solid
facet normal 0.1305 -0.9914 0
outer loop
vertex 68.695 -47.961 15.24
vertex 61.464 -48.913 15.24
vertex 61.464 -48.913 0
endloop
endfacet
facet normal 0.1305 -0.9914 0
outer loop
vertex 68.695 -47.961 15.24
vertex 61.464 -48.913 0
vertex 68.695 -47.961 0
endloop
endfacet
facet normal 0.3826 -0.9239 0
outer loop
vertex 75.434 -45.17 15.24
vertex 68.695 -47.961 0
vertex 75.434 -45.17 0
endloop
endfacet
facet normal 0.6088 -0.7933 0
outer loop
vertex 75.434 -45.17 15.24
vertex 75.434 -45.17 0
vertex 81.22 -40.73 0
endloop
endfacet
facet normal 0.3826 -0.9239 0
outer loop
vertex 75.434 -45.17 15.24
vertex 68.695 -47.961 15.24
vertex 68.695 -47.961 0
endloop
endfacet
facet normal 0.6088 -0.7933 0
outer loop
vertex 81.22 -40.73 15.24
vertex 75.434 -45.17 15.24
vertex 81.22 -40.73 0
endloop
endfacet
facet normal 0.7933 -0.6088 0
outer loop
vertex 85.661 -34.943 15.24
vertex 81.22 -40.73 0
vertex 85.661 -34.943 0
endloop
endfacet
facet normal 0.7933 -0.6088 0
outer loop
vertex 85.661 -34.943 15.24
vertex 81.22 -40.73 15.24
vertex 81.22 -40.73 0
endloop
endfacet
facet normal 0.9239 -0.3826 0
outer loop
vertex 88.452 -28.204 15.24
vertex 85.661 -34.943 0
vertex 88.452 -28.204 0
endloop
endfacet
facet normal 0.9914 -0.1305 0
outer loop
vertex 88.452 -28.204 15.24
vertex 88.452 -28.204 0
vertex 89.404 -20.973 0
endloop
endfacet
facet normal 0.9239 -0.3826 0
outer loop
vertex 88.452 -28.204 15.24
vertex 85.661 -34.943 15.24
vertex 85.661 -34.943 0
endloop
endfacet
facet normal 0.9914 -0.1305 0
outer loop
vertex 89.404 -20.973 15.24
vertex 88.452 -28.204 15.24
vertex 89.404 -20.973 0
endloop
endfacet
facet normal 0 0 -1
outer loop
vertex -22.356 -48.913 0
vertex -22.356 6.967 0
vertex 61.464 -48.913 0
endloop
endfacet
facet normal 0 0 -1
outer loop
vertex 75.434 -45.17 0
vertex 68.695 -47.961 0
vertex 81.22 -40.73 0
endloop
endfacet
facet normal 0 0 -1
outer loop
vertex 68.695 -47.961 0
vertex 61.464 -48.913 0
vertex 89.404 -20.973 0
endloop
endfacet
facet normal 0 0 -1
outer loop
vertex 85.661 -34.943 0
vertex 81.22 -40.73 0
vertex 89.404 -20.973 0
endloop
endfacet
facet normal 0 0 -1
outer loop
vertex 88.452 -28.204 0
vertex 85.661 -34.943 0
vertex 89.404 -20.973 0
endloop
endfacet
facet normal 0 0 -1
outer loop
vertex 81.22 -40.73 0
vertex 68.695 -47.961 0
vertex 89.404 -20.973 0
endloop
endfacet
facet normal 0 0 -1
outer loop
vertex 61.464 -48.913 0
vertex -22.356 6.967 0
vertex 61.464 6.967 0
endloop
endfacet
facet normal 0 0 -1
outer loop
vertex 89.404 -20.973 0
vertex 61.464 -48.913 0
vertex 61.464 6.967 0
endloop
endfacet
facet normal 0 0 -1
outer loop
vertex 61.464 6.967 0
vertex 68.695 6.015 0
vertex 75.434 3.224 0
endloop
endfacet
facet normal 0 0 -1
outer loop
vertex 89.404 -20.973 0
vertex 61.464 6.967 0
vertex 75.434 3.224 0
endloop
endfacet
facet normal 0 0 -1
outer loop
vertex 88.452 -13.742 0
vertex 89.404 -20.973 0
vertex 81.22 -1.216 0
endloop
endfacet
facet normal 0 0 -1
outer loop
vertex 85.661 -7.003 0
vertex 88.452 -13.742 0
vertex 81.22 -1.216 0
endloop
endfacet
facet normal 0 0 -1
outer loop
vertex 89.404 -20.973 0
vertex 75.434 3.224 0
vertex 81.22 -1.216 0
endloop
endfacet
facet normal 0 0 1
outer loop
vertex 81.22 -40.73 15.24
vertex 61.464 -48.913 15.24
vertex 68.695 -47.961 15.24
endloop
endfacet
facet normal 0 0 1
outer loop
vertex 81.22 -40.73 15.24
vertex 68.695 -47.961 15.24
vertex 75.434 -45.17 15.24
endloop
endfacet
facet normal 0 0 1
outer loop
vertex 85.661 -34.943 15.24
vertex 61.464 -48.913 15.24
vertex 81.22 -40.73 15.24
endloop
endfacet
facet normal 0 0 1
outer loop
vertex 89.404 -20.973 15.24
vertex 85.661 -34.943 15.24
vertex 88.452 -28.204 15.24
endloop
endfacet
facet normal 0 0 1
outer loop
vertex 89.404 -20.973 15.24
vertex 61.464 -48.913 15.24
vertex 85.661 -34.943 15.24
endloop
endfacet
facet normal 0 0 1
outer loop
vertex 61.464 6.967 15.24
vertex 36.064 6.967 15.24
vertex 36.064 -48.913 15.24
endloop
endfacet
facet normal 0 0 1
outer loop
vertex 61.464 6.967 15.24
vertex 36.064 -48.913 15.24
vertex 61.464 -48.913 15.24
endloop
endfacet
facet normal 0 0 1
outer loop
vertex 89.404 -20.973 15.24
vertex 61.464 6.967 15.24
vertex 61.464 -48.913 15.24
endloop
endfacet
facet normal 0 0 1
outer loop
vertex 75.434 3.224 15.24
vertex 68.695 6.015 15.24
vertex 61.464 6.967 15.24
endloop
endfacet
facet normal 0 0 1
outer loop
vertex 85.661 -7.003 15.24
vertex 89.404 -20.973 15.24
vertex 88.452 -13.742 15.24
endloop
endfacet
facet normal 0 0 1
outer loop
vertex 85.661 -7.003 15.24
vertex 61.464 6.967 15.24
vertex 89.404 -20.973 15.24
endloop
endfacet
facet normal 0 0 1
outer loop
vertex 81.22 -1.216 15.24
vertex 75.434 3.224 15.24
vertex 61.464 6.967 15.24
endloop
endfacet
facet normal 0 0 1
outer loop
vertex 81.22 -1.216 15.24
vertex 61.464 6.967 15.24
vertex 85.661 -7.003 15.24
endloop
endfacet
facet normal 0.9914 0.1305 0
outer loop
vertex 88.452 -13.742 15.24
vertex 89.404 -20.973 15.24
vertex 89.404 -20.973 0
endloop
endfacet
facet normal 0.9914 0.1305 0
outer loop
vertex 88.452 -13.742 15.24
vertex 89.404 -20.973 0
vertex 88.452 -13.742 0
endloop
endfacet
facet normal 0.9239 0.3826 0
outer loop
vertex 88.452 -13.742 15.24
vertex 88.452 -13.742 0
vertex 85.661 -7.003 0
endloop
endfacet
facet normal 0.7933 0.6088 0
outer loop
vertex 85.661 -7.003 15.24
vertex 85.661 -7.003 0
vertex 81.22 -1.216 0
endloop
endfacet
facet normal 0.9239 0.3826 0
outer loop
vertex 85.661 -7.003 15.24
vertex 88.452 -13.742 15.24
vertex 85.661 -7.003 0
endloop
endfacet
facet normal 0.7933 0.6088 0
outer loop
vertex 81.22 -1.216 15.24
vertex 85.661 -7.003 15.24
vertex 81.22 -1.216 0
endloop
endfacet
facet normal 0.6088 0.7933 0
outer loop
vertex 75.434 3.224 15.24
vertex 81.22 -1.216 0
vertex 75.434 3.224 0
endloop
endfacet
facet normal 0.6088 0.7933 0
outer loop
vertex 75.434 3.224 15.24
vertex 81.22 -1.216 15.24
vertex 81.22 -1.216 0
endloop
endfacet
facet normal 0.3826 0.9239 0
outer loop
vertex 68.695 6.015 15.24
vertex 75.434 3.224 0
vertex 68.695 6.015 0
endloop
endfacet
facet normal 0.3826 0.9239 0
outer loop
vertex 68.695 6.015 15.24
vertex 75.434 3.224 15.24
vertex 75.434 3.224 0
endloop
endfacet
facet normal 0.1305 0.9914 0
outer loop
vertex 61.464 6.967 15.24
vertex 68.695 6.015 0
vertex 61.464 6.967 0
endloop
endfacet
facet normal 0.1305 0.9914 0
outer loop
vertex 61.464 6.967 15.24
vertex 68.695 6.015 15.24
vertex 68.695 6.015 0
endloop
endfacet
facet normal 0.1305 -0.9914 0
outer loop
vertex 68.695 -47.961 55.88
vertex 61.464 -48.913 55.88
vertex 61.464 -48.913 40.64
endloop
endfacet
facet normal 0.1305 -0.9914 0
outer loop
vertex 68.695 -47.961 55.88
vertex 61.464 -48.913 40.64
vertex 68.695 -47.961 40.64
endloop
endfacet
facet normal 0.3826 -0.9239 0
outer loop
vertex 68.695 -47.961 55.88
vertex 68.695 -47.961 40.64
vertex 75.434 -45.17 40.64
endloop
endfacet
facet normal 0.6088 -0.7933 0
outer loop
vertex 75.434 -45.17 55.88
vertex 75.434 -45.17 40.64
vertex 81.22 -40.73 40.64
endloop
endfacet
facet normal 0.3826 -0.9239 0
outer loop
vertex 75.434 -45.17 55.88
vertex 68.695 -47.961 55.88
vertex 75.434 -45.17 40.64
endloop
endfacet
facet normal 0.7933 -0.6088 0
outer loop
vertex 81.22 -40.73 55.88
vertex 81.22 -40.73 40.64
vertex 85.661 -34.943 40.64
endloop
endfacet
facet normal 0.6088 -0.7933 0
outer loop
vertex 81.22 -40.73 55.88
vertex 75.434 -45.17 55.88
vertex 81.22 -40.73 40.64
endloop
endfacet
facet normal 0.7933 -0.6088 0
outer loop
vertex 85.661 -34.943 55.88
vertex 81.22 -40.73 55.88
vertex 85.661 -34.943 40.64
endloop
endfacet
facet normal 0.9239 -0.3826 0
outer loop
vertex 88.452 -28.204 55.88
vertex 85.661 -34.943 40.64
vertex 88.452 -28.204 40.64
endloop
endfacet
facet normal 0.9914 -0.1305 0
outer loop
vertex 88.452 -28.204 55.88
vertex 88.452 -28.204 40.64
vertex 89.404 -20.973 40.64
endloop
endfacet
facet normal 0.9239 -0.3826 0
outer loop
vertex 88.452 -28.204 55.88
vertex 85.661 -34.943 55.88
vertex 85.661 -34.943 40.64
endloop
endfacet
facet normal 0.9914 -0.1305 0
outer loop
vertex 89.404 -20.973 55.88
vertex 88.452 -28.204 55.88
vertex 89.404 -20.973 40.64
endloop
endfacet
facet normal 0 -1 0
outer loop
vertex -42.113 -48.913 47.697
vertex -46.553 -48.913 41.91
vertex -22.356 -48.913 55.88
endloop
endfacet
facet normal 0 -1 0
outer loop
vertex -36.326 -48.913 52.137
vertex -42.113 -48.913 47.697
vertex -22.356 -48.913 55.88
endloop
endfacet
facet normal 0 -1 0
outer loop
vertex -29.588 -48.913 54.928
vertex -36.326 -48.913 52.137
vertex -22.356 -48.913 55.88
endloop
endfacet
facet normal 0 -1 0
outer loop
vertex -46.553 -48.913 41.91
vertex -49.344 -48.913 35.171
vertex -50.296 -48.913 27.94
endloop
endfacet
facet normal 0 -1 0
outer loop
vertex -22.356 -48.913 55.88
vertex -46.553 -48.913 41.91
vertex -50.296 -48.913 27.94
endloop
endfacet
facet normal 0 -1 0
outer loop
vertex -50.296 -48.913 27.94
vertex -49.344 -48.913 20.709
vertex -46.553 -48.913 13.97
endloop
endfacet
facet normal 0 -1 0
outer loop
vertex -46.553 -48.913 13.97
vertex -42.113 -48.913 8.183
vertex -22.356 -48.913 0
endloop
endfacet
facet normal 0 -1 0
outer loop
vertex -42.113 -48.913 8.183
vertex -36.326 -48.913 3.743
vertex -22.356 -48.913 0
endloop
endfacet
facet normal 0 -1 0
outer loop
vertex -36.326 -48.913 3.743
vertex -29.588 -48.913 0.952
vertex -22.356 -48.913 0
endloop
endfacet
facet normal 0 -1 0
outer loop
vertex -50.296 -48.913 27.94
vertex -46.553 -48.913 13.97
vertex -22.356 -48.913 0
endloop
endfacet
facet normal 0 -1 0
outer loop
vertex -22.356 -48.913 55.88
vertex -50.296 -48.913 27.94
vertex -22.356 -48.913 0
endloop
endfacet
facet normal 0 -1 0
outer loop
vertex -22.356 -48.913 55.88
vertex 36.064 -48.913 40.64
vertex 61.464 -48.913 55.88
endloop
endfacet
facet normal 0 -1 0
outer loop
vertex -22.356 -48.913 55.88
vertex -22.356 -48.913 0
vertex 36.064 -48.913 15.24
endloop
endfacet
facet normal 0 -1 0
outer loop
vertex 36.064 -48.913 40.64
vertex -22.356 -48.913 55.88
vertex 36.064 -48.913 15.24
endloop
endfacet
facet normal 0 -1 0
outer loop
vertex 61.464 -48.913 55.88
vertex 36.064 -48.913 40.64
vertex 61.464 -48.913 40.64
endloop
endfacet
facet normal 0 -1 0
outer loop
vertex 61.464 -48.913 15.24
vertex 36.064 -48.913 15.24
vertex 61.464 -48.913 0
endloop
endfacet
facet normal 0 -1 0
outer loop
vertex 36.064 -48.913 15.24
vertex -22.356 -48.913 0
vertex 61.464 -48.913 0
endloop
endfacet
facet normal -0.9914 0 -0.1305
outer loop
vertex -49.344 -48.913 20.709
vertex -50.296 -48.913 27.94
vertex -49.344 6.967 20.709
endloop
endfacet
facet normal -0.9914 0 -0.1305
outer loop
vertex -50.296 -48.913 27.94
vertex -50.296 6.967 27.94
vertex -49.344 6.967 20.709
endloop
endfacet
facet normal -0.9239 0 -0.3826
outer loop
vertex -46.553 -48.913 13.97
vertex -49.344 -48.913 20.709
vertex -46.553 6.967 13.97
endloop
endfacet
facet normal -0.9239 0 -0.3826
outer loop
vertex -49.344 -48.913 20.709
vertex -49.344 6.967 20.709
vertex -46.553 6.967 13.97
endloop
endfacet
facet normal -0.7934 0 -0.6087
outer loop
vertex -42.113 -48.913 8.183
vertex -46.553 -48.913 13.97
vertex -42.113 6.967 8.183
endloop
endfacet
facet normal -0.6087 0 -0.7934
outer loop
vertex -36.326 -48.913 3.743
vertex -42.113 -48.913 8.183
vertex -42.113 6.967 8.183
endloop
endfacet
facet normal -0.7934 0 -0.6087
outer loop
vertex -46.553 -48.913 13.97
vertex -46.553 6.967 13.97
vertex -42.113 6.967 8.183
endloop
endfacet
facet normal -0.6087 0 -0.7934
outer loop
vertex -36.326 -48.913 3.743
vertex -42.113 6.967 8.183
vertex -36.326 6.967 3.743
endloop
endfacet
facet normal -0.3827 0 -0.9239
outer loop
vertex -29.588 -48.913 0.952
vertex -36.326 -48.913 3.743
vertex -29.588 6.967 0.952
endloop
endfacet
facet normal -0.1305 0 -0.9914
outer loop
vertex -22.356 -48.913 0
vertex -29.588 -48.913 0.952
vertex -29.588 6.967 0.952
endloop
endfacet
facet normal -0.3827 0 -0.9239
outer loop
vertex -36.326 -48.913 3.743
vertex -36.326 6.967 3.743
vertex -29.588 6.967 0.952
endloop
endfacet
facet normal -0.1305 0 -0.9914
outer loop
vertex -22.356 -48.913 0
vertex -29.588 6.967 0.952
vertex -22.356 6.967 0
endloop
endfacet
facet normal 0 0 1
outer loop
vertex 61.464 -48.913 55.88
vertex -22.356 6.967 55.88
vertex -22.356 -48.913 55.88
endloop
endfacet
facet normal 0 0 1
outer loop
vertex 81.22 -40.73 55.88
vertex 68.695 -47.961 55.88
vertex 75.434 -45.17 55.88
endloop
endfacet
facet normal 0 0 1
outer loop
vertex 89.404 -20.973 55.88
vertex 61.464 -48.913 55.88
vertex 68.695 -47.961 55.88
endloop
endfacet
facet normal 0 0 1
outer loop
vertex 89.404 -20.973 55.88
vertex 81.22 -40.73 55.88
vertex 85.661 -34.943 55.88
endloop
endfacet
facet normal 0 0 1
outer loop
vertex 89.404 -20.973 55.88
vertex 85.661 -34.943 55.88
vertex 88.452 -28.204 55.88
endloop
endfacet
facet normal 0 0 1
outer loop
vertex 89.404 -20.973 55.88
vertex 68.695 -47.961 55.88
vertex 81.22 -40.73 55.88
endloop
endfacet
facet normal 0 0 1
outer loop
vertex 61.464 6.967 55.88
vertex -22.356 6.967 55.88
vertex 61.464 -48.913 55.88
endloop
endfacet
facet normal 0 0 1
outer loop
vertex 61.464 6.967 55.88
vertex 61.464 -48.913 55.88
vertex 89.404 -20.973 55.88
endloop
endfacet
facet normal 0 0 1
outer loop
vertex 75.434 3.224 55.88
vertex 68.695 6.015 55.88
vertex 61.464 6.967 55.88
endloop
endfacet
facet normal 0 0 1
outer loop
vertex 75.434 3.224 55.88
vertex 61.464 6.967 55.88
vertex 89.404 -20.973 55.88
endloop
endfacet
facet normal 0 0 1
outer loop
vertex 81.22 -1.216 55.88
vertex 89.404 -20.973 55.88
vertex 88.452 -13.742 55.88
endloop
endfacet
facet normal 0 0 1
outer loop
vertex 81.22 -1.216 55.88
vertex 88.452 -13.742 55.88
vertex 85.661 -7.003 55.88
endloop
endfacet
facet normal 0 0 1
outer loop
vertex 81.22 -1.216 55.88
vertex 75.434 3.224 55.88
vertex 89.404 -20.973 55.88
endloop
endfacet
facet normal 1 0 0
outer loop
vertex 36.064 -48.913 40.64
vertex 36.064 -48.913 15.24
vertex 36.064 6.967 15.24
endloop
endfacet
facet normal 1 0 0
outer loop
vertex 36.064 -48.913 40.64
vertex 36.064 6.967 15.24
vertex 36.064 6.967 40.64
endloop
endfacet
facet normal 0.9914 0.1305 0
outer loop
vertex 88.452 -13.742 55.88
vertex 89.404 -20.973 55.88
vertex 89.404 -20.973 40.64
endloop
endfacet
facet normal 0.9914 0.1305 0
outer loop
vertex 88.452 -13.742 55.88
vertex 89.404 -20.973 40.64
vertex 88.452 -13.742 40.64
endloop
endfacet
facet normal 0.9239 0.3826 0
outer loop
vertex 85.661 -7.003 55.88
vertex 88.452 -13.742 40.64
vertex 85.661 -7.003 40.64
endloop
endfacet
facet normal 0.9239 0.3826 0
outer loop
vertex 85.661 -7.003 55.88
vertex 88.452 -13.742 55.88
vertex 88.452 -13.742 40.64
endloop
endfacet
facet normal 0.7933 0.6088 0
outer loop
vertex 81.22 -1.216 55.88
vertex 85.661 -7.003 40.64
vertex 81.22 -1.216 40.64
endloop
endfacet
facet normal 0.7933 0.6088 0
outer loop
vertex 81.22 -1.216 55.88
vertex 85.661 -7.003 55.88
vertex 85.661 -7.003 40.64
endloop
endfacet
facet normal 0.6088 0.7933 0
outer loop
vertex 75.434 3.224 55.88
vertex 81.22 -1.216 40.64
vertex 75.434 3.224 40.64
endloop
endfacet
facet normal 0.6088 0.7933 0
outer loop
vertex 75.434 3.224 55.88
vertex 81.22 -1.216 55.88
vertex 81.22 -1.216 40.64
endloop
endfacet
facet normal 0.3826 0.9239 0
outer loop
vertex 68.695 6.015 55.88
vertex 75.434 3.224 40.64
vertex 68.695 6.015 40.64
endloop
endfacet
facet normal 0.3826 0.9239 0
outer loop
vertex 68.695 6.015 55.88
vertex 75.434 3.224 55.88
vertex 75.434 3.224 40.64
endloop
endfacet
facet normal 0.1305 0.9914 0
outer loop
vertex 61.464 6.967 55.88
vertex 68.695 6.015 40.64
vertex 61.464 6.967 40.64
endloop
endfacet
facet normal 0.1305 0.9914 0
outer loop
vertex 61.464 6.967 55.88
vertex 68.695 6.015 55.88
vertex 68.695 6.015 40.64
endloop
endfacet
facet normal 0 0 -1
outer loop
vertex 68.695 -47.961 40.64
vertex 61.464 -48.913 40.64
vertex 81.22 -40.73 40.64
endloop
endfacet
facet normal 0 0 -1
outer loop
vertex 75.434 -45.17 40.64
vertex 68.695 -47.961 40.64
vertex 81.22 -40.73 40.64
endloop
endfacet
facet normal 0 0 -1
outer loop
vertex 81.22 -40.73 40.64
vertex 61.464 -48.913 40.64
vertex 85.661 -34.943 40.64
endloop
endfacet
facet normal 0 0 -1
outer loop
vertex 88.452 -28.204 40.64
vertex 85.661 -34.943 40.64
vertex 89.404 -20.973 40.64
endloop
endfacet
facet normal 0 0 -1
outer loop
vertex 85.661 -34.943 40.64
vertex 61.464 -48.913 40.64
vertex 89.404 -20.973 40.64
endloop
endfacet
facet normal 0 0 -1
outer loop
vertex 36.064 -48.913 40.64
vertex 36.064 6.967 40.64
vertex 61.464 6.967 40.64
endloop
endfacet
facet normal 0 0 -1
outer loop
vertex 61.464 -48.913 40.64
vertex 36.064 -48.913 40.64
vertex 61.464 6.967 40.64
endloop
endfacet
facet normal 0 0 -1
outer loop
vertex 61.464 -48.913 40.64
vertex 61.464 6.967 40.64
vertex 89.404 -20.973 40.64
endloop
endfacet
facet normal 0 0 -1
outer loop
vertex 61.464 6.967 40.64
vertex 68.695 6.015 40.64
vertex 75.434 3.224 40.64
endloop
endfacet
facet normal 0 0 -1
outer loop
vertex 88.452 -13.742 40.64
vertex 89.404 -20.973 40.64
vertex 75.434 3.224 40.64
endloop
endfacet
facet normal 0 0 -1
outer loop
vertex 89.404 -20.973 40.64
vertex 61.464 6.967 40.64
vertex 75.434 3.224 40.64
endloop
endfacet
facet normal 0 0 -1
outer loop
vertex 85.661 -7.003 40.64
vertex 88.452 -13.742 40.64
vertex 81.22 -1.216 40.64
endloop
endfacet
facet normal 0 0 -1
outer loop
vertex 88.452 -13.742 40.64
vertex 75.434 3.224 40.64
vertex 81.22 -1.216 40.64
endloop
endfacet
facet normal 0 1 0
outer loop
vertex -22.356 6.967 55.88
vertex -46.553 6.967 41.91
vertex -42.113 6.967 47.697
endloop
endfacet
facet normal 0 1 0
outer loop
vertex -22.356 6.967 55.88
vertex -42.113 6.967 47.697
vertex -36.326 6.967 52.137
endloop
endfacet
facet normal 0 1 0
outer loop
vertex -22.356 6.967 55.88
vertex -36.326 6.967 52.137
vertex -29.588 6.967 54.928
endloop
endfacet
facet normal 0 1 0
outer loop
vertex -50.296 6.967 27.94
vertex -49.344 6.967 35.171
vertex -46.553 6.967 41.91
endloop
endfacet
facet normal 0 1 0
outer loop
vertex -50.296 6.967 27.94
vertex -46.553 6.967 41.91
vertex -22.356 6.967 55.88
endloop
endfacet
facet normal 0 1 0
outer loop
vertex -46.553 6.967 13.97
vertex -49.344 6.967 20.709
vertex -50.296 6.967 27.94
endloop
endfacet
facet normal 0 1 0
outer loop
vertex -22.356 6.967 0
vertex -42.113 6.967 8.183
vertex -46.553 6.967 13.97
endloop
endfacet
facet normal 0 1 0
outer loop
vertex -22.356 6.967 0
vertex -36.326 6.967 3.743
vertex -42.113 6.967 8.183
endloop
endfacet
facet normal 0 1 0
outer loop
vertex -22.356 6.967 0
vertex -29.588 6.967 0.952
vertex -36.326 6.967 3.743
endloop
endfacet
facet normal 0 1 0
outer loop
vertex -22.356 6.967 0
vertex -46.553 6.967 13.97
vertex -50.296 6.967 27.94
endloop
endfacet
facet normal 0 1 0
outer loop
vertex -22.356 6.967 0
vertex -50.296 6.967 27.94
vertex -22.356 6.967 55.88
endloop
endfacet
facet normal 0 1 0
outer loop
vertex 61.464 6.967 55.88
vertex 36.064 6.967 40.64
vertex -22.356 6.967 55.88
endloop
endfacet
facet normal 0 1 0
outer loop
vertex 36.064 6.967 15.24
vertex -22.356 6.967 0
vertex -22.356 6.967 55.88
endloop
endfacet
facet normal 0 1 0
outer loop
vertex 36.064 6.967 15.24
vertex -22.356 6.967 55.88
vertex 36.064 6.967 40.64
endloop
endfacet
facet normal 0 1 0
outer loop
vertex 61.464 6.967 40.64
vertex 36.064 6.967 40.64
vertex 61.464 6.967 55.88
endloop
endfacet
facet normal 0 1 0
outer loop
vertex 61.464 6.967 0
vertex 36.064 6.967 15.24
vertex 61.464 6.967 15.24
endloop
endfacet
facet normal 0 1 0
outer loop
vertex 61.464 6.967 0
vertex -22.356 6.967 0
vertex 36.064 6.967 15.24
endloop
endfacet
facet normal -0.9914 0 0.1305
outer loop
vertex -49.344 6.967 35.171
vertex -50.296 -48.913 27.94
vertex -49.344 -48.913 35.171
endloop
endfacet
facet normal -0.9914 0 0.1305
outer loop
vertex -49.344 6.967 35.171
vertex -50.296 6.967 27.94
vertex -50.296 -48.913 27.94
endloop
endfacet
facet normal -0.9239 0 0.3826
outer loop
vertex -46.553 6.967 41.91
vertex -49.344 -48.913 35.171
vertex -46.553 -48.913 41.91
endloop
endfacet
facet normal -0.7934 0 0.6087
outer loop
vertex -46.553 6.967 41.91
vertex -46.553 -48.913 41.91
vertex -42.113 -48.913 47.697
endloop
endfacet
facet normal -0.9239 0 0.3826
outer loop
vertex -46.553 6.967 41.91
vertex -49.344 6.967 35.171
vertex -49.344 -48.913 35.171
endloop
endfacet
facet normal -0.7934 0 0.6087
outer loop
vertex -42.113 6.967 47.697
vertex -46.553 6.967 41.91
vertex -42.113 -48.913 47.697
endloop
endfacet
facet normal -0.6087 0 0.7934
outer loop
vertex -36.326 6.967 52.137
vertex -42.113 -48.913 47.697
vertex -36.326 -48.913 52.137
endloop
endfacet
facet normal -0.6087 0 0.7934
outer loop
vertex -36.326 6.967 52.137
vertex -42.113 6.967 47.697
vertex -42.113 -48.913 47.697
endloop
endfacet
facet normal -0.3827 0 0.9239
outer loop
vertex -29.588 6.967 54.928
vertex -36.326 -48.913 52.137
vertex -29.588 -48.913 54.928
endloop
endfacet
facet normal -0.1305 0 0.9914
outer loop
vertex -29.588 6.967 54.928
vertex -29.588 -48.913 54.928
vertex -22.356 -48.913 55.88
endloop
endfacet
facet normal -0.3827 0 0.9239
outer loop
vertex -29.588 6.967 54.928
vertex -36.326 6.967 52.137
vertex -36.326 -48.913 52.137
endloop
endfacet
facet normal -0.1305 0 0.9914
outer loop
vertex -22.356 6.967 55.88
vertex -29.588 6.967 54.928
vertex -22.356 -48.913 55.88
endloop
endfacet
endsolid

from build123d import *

# Parameters (mm, degrees)
F0_W          = 139.7
F0_H          = 55.88
F1_DEPTH      = 55.88
F2_R          = 27.93999
F3_W          = 53.34
F3_H          = 25.4
F4_DEPTH      = 6.9680017111
F4_DEPTH_BACK = 48.9139982889


# Not quite as in the source:
# - a fillet or chamfer is up to 0.001 mm smaller than in the source, because OpenCascade refuses the exact size


with BuildPart() as f1:
    # F0 (on Top) → F1 (new body)
    with BuildSketch(Plane.XY):
        with Locations((19.5538900733, -20.9729982889)):
            Rectangle(F0_W, F0_H)
    extrude(amount=F1_DEPTH)

    # F2 (radius 27.94 in the source; OpenCascade refuses exactly that, so slightly less here)
    f2_edges = [f1.edges().sort_by_distance(p)[0] for p in [
        (-50.29611, -20.972998, 0),
        (-50.29611, -20.972998, 55.88),
        (89.40389, -48.912998, 27.94),
        (89.40389, 6.967002, 27.94),
    ]]
    fillet(f2_edges, radius=F2_R)

    # F3 (on Front) → F4 (cut, two sides)
    with BuildSketch(Plane.XZ) as f4_sk:
        with Locations((62.7338900733, 27.94)):
            Rectangle(F3_W, F3_H)
    extrude(amount=-F4_DEPTH, mode=Mode.SUBTRACT)
    extrude(f4_sk.sketch, amount=F4_DEPTH_BACK, mode=Mode.SUBTRACT)


solid = f1.part
